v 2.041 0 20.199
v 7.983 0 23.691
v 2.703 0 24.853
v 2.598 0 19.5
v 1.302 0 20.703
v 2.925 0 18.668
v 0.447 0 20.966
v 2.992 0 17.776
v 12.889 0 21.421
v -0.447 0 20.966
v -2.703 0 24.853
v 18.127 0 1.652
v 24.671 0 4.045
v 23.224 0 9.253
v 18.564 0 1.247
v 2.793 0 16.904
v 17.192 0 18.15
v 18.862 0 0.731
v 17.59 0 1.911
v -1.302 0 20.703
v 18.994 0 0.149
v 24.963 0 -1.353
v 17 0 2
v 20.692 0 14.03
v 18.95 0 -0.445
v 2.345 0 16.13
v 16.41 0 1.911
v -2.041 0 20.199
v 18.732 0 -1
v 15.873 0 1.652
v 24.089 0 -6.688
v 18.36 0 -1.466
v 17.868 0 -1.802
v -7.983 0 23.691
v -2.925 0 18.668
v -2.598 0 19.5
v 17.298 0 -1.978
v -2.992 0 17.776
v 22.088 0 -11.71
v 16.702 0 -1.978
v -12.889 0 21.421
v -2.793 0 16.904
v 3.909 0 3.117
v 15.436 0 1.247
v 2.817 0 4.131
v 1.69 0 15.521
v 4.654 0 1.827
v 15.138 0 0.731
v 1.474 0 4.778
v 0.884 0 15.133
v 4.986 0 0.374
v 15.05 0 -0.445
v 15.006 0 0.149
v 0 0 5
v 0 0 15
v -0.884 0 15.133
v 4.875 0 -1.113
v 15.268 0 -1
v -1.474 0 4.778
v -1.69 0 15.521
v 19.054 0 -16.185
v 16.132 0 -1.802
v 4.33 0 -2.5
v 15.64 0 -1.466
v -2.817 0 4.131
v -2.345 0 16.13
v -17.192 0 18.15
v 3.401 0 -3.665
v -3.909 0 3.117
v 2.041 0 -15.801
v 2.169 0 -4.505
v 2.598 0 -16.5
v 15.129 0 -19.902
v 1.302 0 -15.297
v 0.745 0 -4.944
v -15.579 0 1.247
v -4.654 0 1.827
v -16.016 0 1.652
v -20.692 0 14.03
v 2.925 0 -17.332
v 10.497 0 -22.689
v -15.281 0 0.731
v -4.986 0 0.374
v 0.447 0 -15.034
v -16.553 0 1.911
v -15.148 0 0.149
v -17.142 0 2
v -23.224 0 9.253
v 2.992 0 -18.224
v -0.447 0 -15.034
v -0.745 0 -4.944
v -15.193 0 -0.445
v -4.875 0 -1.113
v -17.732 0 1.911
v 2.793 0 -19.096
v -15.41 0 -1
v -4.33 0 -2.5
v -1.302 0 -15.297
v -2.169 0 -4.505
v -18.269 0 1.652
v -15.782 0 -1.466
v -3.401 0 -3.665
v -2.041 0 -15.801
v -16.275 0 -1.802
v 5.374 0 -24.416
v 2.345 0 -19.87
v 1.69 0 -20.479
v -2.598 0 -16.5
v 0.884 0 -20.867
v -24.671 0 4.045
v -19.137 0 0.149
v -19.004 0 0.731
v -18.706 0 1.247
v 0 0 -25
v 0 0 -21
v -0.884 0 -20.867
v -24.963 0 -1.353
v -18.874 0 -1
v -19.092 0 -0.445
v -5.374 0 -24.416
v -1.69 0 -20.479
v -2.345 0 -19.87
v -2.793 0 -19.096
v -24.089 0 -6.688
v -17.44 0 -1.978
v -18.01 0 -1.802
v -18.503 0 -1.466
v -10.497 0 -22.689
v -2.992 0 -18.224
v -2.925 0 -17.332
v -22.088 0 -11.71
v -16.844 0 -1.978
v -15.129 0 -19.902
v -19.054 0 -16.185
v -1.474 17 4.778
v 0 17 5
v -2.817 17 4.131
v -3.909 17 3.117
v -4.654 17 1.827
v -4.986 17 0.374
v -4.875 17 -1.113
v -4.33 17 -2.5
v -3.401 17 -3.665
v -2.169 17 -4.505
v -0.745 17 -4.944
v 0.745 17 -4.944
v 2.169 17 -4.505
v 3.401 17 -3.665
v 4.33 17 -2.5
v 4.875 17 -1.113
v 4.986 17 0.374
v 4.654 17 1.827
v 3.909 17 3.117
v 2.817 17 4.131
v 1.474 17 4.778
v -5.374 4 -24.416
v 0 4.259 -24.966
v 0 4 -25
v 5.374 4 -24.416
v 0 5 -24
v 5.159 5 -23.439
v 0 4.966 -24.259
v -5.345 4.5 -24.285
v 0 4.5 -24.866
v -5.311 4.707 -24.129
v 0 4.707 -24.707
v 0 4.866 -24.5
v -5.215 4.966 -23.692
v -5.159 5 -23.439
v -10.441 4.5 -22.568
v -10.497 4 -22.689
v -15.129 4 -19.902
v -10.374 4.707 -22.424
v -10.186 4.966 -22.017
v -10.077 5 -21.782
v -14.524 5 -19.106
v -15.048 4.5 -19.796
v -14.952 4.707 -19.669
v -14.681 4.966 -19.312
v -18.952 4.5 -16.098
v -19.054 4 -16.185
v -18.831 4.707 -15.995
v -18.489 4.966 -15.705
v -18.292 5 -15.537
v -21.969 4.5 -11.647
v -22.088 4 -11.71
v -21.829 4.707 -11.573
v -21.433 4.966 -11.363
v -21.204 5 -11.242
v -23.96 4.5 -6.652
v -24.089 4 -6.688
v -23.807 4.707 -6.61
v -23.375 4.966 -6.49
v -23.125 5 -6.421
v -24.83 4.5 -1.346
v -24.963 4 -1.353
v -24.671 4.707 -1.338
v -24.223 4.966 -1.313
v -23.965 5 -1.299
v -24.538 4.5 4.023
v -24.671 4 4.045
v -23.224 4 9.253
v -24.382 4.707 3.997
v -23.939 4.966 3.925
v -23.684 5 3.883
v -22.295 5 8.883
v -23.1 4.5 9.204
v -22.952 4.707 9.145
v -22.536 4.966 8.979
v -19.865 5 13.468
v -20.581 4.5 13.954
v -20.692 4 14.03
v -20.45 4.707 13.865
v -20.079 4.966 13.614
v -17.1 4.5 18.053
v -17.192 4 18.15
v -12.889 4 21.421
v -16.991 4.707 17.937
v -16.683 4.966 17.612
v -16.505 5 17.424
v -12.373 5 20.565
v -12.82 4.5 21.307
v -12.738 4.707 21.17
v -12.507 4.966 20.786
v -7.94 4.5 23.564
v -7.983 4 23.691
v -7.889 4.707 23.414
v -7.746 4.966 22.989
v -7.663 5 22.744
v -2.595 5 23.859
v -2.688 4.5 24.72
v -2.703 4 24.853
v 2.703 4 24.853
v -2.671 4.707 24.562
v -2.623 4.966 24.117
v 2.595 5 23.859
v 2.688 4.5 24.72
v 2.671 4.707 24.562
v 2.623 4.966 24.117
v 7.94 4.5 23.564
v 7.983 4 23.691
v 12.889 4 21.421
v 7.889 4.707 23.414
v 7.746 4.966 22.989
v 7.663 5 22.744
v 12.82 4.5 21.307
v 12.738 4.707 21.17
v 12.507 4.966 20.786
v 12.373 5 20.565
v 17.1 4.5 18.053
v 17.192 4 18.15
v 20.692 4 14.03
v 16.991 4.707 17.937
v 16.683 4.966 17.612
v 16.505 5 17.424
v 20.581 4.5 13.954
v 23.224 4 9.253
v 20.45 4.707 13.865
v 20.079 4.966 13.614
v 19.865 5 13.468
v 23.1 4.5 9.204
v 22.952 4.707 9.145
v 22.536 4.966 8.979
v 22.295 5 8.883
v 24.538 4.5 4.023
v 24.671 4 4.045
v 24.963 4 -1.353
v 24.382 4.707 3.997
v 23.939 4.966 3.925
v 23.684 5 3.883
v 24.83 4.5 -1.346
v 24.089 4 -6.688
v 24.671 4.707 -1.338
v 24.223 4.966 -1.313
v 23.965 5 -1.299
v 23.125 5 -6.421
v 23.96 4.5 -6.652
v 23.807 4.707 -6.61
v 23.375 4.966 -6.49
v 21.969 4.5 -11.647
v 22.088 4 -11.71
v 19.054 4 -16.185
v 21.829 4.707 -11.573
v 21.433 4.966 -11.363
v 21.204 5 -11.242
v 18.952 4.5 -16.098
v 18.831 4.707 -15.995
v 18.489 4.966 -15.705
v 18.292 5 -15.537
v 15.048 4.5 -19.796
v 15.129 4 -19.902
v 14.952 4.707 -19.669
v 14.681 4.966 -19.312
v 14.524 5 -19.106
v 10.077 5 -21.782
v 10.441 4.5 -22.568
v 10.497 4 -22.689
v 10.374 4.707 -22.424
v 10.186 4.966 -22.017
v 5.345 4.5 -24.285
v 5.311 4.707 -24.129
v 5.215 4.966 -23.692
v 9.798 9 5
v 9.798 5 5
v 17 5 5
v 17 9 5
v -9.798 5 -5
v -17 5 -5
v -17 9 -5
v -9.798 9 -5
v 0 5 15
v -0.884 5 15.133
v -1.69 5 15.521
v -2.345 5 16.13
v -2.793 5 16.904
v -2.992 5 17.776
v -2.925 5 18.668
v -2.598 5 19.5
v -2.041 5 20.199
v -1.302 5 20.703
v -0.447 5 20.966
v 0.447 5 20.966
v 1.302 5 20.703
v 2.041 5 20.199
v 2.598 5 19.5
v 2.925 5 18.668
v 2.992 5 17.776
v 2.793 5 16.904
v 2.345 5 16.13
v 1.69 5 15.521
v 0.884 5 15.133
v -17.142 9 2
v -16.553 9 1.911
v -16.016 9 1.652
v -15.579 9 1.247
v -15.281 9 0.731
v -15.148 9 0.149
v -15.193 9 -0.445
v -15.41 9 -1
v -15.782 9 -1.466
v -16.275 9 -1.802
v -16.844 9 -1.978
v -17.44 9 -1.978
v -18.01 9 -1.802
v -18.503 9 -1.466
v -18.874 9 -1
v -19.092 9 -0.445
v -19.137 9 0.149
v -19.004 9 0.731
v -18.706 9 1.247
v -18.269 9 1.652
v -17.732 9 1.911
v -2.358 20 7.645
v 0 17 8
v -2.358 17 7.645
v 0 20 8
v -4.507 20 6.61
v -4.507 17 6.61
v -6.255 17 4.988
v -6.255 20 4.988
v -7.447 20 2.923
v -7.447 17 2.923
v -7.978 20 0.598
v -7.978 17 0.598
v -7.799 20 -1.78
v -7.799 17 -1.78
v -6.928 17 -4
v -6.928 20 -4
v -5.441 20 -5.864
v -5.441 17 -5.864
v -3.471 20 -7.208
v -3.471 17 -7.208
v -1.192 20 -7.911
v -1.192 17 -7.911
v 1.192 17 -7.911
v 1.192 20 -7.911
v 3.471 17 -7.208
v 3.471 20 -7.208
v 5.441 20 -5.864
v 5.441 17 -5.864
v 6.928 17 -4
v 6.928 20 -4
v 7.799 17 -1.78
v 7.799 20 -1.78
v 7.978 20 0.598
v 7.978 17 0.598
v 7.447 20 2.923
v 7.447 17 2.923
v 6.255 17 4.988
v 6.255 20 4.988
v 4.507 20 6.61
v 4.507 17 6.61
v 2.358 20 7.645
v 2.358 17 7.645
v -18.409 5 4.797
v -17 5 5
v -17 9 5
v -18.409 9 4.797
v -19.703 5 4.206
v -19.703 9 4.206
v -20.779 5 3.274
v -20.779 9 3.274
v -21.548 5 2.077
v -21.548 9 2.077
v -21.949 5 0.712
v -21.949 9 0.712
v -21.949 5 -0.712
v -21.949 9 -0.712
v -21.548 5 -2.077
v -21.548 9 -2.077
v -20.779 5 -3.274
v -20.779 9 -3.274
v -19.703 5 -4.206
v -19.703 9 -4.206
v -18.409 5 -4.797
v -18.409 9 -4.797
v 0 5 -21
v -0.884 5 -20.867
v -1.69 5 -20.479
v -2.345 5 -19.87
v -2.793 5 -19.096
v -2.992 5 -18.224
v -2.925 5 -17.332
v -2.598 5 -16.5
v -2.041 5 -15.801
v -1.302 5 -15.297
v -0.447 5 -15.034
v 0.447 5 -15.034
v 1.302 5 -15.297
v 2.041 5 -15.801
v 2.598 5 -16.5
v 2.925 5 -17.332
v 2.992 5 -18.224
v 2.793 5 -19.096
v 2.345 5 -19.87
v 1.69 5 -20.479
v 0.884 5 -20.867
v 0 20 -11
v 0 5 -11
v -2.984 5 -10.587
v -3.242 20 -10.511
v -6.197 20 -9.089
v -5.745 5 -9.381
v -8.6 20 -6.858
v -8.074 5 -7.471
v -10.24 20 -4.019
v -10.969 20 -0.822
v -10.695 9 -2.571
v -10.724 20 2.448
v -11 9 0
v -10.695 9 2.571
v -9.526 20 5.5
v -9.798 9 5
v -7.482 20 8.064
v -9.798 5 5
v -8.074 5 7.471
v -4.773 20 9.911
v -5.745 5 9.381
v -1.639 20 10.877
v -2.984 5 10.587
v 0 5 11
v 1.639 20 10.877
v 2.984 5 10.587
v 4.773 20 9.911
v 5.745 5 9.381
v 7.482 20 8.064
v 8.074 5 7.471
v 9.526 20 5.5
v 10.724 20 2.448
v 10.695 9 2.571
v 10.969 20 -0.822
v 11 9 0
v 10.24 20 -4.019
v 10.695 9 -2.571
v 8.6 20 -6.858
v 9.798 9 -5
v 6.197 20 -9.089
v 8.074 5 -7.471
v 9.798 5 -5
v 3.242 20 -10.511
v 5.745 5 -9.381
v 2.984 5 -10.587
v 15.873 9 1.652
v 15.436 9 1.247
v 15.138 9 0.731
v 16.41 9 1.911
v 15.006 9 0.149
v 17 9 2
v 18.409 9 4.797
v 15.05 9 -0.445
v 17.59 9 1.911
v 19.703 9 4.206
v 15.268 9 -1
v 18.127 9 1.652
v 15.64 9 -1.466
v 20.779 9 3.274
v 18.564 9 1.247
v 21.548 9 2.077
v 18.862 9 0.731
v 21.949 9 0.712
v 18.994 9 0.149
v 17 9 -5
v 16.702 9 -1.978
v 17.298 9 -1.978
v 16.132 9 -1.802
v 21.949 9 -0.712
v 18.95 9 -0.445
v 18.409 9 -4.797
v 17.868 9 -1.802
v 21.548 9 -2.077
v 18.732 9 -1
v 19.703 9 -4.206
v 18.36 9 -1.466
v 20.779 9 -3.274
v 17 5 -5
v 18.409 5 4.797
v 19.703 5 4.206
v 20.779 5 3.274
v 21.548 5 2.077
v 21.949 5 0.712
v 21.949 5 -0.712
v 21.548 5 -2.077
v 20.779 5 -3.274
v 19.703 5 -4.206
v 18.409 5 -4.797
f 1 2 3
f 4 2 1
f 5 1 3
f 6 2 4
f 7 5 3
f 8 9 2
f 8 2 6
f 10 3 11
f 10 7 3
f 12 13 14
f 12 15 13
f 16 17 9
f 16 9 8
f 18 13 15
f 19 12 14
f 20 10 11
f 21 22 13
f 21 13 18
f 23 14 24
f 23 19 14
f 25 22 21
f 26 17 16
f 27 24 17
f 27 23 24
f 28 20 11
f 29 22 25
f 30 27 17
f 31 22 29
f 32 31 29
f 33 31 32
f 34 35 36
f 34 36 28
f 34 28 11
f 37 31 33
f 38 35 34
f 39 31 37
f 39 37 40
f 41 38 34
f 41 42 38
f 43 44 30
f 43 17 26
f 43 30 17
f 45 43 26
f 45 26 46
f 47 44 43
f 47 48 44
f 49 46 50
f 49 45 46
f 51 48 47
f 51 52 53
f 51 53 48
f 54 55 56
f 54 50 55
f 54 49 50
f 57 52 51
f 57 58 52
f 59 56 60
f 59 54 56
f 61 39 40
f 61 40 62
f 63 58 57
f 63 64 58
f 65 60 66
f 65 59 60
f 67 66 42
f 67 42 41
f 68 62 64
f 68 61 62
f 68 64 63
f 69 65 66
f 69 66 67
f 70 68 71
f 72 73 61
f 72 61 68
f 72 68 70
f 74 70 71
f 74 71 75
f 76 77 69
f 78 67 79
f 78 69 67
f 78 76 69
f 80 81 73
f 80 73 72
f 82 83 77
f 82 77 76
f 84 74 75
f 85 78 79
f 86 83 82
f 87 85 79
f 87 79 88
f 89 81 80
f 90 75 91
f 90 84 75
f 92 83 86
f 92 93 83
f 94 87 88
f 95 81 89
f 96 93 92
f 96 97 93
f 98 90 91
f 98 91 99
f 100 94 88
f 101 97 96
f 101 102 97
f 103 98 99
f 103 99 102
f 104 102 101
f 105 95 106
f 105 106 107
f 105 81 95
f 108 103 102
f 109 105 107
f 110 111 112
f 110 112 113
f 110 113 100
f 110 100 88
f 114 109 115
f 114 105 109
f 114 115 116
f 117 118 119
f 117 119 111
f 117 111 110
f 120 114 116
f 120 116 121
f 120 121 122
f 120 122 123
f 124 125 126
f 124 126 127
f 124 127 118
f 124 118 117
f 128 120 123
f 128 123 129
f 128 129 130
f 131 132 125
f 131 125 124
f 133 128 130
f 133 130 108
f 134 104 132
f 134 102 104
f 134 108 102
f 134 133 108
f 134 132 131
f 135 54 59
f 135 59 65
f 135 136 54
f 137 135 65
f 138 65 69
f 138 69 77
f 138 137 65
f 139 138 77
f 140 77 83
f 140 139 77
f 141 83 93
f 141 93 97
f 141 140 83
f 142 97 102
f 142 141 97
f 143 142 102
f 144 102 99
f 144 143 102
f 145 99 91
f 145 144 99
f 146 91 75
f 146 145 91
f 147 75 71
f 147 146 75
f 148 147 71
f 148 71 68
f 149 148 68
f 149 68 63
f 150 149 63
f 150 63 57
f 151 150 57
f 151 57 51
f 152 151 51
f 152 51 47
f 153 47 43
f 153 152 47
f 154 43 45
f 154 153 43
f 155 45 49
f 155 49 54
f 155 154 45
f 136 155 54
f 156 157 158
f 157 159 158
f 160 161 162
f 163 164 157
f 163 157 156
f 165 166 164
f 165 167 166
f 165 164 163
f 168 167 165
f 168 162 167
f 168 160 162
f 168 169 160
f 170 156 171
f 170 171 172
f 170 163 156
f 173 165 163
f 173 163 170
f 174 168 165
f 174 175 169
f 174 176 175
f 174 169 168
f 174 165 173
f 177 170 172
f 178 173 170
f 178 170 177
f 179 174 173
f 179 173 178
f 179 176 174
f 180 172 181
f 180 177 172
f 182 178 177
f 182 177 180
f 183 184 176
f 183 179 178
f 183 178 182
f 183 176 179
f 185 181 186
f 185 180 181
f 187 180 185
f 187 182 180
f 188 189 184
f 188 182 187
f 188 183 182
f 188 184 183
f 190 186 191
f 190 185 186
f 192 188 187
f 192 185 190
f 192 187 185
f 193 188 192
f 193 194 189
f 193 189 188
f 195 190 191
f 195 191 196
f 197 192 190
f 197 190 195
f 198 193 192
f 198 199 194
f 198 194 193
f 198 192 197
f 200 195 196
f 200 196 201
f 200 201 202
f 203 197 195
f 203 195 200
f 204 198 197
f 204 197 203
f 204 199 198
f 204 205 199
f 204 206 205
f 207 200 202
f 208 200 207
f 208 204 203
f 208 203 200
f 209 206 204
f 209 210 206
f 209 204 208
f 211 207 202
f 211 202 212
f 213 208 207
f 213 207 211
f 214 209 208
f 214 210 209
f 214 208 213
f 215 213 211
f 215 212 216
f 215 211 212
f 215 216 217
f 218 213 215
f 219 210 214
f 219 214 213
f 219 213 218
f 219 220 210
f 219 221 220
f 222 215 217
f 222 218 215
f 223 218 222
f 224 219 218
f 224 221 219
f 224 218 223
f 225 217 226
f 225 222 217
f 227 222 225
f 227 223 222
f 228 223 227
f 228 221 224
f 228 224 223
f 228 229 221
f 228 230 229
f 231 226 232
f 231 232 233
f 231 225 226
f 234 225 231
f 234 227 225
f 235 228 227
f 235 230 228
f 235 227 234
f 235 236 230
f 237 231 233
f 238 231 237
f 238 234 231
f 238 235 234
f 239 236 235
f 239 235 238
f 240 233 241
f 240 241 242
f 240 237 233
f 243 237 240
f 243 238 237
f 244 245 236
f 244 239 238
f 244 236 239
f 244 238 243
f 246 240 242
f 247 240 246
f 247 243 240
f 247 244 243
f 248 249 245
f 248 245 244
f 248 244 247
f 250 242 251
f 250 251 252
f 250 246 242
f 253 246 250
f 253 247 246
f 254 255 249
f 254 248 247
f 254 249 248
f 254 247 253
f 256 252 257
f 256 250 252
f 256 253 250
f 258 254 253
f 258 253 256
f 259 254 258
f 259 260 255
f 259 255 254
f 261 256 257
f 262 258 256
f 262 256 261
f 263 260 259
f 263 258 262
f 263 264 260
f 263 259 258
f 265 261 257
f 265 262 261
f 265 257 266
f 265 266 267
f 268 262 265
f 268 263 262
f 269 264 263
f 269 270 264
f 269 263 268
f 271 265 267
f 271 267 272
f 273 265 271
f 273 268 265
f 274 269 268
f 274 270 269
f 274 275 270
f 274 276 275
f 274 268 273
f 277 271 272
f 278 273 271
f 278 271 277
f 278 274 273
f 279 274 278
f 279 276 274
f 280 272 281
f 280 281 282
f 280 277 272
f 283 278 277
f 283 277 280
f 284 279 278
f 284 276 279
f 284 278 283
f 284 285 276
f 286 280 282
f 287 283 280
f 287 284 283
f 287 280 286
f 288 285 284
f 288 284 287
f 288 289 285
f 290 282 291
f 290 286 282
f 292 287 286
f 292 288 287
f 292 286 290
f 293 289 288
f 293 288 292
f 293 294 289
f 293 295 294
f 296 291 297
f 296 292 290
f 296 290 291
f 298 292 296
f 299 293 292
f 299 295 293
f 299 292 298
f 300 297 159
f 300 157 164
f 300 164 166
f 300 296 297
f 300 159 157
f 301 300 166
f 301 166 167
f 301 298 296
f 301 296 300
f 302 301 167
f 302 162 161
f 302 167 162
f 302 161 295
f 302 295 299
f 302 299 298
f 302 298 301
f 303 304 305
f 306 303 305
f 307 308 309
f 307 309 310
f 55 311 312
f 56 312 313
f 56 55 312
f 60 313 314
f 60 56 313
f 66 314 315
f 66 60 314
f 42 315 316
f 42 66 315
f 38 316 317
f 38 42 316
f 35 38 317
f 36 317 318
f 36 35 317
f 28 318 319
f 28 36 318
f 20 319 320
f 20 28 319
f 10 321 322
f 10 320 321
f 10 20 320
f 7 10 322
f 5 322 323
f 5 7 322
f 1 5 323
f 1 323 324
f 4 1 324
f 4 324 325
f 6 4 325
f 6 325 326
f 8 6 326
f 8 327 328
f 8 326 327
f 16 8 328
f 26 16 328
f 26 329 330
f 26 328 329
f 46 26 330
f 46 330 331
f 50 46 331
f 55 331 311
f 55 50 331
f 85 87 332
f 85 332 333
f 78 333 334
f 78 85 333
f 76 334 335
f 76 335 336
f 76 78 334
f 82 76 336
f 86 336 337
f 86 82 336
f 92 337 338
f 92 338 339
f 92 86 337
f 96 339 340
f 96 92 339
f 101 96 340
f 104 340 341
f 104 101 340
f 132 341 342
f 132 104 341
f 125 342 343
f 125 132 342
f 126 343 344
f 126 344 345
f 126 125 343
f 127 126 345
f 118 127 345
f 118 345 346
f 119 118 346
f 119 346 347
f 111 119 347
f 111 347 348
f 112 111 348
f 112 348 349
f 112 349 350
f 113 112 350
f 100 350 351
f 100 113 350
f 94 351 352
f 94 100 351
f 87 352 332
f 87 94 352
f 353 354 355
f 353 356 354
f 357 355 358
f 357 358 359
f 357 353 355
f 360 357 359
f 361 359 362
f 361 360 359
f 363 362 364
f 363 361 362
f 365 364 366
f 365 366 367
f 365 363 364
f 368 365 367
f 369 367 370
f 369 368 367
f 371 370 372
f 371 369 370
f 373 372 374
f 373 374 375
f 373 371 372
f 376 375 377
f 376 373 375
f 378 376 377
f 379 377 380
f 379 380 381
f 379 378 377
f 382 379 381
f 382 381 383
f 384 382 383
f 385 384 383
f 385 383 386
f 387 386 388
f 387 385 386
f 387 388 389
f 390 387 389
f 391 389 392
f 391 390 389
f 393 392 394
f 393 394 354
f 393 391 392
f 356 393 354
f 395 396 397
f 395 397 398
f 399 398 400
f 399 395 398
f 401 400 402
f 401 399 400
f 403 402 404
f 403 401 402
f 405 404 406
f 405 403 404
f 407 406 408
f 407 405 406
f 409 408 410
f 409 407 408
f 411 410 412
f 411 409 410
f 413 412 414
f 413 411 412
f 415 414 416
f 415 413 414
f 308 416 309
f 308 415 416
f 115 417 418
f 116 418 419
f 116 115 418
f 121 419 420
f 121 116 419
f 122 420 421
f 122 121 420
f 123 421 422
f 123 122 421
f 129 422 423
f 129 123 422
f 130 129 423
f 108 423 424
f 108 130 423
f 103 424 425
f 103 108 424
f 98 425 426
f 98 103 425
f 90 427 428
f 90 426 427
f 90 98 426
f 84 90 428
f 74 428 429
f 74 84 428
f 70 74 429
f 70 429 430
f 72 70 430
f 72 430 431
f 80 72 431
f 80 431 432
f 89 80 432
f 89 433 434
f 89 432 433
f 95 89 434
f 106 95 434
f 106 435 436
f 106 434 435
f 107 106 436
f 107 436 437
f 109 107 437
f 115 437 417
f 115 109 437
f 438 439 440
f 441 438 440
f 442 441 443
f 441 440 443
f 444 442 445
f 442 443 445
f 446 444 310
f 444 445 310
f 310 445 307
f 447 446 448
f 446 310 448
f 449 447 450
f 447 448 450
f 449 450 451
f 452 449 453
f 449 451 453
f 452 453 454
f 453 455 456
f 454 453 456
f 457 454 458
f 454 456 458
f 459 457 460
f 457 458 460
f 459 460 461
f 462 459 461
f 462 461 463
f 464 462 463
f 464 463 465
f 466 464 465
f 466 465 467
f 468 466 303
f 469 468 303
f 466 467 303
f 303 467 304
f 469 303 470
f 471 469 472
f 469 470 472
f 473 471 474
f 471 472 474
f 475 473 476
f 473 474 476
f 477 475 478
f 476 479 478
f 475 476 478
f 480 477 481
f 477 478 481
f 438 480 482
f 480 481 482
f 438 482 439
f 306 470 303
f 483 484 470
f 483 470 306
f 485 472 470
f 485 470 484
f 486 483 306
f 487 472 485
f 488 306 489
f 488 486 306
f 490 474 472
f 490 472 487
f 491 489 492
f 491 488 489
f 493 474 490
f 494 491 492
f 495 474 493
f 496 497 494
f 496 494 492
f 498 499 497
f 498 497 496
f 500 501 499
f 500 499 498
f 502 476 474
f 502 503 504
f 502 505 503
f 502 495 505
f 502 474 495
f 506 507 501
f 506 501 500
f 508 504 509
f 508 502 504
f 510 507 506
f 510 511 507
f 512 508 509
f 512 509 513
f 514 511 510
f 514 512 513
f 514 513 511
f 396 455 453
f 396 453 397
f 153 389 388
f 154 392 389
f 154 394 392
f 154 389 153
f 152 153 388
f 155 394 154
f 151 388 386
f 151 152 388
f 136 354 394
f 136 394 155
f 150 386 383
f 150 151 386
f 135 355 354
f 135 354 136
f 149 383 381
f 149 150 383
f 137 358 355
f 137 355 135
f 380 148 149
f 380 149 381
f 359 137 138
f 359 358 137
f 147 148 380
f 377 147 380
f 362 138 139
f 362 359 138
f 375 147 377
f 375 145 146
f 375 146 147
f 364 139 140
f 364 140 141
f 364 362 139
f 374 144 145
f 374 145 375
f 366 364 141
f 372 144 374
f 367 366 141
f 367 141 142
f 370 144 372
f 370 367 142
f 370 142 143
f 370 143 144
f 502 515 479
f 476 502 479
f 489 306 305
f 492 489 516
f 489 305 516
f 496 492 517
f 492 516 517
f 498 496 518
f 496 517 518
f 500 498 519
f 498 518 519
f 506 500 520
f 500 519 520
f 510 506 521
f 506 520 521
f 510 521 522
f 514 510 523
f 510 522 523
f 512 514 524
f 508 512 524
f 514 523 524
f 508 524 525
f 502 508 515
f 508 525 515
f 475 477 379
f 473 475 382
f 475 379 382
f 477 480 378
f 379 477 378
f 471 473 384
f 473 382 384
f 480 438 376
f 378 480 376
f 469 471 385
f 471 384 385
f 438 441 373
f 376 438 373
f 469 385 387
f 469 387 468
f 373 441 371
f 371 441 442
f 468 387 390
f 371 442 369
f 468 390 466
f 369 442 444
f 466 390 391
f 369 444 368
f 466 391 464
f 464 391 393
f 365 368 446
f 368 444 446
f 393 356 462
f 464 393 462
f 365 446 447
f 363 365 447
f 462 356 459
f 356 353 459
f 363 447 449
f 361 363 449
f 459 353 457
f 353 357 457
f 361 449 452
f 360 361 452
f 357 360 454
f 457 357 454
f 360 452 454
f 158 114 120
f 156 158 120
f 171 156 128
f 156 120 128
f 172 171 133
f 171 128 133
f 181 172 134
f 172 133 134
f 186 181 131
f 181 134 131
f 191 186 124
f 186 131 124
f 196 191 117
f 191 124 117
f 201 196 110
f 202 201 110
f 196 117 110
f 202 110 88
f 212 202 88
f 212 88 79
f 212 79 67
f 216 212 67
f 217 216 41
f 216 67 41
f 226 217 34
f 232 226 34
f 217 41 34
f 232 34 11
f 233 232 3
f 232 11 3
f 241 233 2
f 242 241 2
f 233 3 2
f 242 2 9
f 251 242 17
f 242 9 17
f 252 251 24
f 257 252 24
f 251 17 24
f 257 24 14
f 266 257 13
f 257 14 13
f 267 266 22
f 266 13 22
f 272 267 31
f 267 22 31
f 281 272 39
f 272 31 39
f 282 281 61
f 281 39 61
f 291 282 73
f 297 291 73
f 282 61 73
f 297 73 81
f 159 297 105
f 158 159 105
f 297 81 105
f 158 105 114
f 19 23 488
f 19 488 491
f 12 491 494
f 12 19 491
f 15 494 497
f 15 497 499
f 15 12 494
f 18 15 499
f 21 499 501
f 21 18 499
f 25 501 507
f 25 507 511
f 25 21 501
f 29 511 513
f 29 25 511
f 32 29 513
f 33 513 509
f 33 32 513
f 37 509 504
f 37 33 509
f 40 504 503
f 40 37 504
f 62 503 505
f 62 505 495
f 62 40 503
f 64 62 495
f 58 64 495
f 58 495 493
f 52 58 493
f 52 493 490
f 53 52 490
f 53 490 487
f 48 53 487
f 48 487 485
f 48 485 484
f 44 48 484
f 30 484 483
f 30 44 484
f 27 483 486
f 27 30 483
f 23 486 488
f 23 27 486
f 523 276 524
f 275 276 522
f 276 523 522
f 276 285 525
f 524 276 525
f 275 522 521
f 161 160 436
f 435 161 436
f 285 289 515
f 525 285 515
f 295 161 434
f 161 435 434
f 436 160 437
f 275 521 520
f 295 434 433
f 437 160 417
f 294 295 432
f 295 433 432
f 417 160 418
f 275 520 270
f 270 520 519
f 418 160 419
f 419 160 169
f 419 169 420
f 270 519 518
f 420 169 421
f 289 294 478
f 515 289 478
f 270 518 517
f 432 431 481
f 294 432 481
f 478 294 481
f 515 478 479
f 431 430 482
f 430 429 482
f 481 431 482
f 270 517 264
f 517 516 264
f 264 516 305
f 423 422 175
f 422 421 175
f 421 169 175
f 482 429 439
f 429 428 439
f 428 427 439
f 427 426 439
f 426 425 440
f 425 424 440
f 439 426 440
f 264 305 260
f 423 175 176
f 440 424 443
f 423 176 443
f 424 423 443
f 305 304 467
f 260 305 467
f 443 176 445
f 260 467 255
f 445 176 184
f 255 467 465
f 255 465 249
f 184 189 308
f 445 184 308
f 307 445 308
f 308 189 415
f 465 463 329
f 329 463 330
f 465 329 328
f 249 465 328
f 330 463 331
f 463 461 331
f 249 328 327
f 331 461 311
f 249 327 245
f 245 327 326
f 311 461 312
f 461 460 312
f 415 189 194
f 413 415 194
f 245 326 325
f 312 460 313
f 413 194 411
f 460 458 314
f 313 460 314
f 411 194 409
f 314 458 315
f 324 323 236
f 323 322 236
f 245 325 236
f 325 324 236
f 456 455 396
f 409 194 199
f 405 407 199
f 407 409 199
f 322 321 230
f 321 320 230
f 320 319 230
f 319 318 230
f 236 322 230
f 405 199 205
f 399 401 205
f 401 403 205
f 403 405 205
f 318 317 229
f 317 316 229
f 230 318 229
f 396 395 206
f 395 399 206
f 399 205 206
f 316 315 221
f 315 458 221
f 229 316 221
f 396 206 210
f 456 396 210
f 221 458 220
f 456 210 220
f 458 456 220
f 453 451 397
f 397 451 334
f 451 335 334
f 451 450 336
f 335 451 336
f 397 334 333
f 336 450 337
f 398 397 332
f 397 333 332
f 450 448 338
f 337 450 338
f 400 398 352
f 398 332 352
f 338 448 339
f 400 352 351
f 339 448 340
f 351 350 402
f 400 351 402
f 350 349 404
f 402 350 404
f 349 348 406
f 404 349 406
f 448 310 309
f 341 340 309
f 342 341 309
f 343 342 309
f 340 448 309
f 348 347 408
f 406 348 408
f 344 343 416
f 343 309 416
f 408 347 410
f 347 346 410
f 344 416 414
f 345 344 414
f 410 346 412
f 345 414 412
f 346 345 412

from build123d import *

# Parameters (mm, degrees)
EXTRUDE_2_DEPTH     = 9
SKETCH_4_R          = 2
SKETCH_4_R_2        = 3
CUT_EXTRUDE_1_DEPTH = 9
FILLET_1_R          = 1


with BuildPart() as part:
    # 草圖1 → 旋轉1 (revolve)
    with BuildSketch(Plane.XY, mode=Mode.PRIVATE) as revolve_1_sk:
        Polygon((25, 0), (0, 0), (0, 20), (11, 20), (11, 5), (25, 5), align=None)
    revolve(revolve_1_sk.sketch.rotate(Axis((0, 0, 0), (0, 1, 0)), 90), axis=Axis((0, 0, 0), (0, 1, 0)))

    # 草圖2 → 除料-旋轉1 (revolve, cut)
    with BuildSketch(Plane.XY, mode=Mode.PRIVATE) as cut_revolve_1_sk:
        Polygon((0, 20), (0, 0), (5, 0), (5, 17), (8, 17), (8, 20), align=None)
    revolve(cut_revolve_1_sk.sketch.rotate(Axis((0, 20, 0), (0, -1, 0)), 90), axis=Axis((0, 20, 0), (0, -1, 0)), mode=Mode.SUBTRACT)

    # 草圖3 → 填料-伸長2 (add)
    with BuildSketch(Plane(origin=(0, 0, 0), x_dir=(1, 0, 0), z_dir=(0, 1, 0))):
        with BuildLine():
            Line((-17, 5), (-9.797958971, 5))
            Line((-9.797958971, 5), (-9.797958971, -5))
            Line((-9.797958971, -5), (-17, -5))
            ThreePointArc((-17, -5), (-22, 0), (-17, 5))
        make_face()
        with BuildLine():
            Line((9.797958971, 5), (9.797958971, -5))
            Line((9.797958971, -5), (17, -5))
            ThreePointArc((17, -5), (22, 0), (17, 5))
            Line((17, 5), (9.797958971, 5))
        make_face()
    extrude(amount=EXTRUDE_2_DEPTH)

    # 草圖4 → 除料-伸長1 (cut)
    with BuildSketch(Plane(origin=(0, 0, 0), x_dir=(1, 0, 0), z_dir=(0, 1, 0))):
        with Locations(Location((-17.142374929, 0, 0), (0, 0, 270))):
            Circle(SKETCH_4_R)
        with Locations(Location((17, 0, 0), (0, 0, 270))):
            Circle(SKETCH_4_R)
        with Locations(Location((0, 18, 0), (0, 0, 90))):
            Circle(SKETCH_4_R_2)
        with Locations(Location((0, -18, 0), (0, 0, 90))):
            Circle(SKETCH_4_R_2)
    extrude(amount=CUT_EXTRUDE_1_DEPTH, mode=Mode.SUBTRACT)

    # 圓角1
    fillet_1_edges = [part.edges().sort_by_distance(p)[0] for p in [
        (0, 5, 25),
    ]]
    fillet(fillet_1_edges, radius=FILLET_1_R)


solid = part.part
